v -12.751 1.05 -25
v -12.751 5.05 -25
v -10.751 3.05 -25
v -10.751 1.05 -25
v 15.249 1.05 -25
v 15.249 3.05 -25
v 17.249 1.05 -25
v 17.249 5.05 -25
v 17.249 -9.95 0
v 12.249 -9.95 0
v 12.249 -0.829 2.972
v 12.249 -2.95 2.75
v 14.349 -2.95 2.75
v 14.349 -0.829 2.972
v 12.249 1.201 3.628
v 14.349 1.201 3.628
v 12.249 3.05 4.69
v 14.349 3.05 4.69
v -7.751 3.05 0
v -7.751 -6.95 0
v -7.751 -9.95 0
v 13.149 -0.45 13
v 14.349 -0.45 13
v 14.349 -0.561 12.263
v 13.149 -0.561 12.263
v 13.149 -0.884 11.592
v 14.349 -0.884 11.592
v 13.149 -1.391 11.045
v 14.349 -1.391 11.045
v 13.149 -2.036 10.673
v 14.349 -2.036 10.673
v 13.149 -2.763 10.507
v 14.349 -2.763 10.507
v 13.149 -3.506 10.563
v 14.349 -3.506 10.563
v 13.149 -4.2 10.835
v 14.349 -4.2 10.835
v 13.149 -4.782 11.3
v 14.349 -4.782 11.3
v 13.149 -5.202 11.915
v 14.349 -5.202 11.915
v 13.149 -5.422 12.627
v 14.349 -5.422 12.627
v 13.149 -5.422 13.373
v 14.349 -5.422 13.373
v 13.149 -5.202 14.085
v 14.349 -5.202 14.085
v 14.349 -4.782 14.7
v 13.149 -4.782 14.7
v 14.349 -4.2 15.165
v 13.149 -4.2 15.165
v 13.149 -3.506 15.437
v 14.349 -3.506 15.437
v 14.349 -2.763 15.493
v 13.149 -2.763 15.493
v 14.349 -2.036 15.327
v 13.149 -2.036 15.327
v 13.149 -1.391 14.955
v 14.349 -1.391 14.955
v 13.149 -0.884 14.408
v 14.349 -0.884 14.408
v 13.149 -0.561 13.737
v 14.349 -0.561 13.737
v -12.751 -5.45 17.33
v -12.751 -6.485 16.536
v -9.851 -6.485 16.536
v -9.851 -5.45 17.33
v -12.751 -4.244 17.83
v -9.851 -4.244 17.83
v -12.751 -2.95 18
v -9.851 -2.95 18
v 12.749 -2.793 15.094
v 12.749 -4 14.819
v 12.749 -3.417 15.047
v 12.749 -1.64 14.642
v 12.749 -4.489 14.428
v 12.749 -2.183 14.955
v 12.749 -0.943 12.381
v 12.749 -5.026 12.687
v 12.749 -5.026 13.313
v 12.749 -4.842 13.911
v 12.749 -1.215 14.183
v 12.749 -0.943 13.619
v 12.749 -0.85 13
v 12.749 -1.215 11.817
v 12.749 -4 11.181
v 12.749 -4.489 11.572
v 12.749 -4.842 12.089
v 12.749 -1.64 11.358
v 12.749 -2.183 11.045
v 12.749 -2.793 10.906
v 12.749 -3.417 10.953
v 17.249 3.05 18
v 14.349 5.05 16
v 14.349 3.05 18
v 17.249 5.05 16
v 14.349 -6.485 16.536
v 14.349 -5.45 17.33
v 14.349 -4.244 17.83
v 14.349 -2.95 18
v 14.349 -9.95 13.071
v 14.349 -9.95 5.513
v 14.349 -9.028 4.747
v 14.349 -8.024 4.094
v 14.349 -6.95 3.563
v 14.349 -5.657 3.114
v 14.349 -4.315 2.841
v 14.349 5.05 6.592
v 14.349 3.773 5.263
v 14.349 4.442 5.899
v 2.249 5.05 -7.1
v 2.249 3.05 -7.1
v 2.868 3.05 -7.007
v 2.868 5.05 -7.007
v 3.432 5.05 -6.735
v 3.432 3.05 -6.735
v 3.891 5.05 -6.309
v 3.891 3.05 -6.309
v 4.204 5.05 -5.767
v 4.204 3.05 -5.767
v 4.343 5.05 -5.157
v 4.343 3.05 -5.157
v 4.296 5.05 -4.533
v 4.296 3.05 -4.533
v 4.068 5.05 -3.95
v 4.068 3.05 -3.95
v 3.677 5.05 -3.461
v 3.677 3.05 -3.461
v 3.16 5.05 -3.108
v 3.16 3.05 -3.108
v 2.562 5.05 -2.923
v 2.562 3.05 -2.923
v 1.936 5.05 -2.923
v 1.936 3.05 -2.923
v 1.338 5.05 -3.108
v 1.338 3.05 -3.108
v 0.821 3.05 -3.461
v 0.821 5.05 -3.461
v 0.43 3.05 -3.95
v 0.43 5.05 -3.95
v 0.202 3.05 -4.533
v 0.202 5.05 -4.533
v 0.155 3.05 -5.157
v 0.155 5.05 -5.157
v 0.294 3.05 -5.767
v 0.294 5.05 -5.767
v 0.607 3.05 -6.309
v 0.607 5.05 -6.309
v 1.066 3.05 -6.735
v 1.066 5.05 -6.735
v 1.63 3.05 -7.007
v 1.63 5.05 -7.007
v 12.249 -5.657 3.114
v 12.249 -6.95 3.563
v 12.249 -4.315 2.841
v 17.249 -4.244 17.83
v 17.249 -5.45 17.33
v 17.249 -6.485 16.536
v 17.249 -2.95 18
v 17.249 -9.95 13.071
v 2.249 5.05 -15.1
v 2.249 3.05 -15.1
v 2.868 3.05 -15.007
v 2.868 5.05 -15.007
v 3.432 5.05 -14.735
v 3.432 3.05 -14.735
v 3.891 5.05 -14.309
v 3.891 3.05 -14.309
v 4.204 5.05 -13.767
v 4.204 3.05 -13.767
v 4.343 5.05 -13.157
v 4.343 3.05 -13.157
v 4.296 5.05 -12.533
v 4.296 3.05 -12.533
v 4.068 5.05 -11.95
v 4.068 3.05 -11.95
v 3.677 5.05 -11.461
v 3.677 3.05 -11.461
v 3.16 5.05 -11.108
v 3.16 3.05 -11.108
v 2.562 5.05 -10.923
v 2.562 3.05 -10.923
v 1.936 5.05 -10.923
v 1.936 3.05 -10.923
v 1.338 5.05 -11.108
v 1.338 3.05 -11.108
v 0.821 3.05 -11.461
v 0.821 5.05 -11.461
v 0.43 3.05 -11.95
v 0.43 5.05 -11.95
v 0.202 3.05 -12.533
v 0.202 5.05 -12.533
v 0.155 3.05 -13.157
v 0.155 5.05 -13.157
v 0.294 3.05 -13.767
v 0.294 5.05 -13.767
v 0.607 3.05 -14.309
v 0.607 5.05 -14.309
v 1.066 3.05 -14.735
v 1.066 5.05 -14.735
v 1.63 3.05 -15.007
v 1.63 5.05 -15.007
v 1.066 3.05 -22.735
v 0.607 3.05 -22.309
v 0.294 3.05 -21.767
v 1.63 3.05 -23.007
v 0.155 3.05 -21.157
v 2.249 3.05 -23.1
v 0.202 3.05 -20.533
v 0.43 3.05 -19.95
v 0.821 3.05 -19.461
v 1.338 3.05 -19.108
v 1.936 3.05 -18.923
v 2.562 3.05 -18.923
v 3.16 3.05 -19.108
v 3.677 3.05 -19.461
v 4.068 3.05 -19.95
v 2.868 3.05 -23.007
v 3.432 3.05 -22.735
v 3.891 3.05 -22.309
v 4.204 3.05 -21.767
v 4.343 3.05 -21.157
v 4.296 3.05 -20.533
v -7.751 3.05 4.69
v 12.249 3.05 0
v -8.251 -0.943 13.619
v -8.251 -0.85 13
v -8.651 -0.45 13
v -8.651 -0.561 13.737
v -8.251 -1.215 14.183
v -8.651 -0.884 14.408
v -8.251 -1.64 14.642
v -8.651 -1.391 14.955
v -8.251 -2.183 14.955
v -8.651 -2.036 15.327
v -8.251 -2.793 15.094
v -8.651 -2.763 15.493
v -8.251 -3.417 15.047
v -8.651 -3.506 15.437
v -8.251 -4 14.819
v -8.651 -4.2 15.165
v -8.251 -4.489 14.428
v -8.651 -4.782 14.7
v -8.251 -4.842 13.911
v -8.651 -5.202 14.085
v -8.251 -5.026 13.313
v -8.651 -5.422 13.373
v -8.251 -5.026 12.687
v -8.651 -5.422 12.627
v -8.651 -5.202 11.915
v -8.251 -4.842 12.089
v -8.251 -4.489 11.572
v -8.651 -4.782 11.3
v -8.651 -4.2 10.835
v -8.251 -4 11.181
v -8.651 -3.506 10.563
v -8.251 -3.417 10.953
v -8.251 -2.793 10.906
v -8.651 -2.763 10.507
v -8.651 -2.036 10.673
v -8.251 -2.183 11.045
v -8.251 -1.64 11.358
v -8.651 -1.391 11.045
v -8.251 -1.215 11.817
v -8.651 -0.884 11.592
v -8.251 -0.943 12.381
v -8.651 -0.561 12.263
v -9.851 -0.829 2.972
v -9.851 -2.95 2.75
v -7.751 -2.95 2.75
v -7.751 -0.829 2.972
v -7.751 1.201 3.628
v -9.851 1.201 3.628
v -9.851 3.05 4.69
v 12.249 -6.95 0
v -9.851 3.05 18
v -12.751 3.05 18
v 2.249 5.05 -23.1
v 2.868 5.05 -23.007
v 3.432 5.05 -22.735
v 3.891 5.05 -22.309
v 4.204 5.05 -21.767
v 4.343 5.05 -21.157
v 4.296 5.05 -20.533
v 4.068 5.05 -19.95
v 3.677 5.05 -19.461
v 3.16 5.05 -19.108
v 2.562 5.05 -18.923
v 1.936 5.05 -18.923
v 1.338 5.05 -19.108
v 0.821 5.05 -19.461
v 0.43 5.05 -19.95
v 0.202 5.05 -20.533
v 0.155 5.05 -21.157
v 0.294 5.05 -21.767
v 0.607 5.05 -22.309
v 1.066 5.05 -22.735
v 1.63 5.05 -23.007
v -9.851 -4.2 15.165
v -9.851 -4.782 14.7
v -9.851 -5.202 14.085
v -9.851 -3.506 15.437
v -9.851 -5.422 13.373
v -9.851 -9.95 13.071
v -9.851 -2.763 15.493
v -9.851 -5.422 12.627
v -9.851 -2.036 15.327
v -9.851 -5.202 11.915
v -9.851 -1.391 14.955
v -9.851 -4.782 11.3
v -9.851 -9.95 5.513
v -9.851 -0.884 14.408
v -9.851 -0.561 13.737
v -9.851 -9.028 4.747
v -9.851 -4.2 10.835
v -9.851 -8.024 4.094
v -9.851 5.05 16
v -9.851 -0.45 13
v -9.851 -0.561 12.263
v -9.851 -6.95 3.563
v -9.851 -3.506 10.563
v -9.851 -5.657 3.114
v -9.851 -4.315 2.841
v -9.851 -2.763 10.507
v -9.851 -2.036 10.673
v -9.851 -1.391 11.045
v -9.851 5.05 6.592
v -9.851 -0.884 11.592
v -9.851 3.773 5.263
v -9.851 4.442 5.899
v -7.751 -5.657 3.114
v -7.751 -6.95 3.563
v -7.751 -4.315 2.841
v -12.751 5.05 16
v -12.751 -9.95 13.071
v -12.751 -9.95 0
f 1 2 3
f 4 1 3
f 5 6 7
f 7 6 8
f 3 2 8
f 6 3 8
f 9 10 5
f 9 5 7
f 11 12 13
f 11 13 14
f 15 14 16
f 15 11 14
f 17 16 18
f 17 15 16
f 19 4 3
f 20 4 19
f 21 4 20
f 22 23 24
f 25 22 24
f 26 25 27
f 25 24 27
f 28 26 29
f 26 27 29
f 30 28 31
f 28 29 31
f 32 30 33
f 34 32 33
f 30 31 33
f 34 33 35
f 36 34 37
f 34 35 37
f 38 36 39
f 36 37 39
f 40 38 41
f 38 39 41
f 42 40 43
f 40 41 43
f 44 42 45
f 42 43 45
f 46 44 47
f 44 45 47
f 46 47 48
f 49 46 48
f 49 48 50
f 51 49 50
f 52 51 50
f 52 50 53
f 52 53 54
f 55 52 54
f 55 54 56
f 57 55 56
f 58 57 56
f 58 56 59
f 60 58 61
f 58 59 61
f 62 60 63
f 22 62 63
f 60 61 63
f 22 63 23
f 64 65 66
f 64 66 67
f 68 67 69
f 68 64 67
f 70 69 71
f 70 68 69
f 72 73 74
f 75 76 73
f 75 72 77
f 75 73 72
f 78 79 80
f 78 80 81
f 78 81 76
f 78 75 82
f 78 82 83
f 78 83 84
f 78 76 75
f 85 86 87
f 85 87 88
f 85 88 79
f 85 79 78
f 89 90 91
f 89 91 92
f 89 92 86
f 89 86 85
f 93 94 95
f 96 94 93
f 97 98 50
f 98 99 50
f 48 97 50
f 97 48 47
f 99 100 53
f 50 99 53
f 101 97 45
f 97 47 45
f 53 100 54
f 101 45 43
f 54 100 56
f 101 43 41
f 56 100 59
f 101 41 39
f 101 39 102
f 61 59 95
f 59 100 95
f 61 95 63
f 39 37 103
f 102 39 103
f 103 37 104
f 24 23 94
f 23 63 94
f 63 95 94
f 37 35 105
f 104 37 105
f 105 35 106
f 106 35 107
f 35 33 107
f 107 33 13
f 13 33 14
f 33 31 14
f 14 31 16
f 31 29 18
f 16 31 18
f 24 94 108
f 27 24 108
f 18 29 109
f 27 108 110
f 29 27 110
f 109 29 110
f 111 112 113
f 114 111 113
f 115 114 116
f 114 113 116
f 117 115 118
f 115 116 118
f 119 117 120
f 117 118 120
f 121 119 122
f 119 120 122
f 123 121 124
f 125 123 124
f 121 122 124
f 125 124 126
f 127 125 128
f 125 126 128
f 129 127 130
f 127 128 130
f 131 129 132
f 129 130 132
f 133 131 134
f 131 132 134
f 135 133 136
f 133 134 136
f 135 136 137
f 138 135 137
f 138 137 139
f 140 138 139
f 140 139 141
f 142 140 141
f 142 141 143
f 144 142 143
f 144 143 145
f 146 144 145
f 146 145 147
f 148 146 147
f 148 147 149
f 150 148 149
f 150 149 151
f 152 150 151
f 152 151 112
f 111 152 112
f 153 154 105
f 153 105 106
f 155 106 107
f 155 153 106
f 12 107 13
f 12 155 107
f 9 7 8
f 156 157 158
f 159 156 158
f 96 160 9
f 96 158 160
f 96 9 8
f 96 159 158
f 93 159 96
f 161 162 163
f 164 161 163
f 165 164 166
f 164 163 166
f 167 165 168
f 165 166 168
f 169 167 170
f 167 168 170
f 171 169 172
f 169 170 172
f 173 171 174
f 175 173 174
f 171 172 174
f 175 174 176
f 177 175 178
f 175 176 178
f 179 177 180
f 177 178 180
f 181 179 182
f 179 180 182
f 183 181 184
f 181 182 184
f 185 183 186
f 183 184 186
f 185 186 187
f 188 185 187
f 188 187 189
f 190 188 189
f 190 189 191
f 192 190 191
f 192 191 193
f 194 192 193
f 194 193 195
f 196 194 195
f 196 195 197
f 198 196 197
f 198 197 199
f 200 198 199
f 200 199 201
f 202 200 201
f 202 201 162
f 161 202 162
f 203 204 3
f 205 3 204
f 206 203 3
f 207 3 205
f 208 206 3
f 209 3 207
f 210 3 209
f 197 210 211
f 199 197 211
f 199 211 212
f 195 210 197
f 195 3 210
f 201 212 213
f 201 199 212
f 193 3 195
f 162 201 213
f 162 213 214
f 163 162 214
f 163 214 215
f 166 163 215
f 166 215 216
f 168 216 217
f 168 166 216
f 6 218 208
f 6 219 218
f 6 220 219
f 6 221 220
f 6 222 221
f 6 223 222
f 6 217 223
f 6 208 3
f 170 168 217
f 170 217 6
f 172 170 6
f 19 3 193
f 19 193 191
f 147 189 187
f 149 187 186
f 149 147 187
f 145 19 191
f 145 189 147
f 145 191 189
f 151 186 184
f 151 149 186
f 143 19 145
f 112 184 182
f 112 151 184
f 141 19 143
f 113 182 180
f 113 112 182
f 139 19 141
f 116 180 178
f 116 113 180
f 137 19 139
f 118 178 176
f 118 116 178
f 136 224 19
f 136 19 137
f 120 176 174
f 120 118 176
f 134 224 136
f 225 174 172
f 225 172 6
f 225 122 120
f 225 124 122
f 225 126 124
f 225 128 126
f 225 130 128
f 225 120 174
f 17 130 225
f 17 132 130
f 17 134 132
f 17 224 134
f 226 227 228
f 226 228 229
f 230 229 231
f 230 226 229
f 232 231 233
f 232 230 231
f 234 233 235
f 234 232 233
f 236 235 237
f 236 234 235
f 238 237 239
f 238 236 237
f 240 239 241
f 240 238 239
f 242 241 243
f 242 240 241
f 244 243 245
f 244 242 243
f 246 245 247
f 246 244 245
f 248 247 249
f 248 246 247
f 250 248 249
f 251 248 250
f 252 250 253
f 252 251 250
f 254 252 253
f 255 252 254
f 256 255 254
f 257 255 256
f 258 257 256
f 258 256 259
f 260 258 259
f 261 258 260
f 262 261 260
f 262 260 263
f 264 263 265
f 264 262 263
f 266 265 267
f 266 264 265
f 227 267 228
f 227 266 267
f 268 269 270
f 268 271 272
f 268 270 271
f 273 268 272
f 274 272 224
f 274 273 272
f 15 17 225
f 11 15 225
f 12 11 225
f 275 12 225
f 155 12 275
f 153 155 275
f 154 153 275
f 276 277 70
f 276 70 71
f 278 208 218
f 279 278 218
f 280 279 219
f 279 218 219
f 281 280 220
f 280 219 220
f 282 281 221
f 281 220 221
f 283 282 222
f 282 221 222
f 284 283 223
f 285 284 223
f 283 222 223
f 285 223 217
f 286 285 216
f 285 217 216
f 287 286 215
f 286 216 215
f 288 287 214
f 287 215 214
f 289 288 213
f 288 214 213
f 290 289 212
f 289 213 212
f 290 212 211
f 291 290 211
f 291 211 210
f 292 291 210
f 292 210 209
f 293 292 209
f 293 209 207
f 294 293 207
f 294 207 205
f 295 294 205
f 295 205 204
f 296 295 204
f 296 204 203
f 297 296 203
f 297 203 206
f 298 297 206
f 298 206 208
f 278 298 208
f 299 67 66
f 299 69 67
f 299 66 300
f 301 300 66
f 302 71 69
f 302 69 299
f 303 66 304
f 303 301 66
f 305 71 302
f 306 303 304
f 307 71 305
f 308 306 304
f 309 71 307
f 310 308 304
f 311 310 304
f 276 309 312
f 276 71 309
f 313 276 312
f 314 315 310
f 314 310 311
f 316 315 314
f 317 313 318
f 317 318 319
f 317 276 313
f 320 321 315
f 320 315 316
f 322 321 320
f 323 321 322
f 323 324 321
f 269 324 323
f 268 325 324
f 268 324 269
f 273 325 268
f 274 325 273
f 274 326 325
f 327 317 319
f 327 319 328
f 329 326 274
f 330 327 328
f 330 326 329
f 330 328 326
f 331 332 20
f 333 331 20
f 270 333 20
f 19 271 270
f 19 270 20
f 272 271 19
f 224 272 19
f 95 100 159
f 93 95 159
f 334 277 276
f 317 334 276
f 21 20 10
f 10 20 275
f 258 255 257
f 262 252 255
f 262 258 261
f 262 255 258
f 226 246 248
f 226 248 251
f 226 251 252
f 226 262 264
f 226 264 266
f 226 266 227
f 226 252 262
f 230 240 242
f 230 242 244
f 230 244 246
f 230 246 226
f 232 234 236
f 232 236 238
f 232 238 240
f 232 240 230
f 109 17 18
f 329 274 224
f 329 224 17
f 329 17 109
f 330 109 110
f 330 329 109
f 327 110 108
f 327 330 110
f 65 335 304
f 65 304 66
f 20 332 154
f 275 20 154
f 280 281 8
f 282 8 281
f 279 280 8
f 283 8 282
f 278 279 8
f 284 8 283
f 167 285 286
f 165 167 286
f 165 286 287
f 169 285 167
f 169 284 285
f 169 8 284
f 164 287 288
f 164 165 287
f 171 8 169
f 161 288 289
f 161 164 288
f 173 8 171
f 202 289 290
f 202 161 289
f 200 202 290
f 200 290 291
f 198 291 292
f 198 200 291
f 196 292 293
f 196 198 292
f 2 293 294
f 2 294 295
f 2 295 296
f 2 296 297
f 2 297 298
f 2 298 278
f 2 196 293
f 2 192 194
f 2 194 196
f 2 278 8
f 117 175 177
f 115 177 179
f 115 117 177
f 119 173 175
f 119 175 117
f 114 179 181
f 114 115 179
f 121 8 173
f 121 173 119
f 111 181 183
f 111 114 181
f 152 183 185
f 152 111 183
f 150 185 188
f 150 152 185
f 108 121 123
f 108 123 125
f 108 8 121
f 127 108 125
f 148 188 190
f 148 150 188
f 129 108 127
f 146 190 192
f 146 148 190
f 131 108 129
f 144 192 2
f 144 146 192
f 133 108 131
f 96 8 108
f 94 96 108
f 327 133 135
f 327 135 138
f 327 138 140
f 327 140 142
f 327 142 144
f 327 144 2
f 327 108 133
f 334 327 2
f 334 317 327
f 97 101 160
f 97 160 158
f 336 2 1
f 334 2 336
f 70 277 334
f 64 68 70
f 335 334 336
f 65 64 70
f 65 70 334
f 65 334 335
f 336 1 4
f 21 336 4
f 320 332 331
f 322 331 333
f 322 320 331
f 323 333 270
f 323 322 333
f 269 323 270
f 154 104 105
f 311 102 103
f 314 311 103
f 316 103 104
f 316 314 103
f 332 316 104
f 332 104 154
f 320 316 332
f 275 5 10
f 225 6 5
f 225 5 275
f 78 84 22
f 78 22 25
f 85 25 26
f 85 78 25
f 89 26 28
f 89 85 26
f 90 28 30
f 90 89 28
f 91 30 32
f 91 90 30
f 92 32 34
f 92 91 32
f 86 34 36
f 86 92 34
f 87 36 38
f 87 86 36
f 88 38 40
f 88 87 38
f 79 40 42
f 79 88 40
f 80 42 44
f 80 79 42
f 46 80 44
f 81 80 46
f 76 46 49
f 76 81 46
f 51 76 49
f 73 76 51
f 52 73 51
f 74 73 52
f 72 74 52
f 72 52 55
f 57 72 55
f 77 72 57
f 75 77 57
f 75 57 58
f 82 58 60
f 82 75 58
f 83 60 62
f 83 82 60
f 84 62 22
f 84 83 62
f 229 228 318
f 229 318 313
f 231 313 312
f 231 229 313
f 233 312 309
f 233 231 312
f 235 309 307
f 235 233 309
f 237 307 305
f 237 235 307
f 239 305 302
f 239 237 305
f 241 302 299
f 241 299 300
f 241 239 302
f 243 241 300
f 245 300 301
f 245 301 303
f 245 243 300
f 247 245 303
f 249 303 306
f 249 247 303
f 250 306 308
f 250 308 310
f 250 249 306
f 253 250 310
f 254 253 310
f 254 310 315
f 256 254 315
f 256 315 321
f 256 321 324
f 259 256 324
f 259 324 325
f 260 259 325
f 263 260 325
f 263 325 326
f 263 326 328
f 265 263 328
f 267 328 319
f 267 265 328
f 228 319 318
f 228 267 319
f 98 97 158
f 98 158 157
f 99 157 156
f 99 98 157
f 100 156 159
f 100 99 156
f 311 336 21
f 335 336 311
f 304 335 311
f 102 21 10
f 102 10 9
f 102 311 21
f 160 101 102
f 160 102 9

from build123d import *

# Parameters (mm, degrees)
SKETCH_1_W               = 30
SKETCH_1_H               = 15
EXTRUDE_1_DEPTH          = 18
CUT_EXTRUDE_1_REACH      = 28.843
SKETCH_2_W               = 20
SKETCH_2_H               = 10
CUT_EXTRUDE_2_REACH      = 29.668
SKETCH_3_W               = 20
SKETCH_3_H               = 12
CUT_EXTRUDE_5_DEPTH      = 22.1
CUT_EXTRUDE_5_DEPTH_BACK = 2.1
SKETCH_4_W               = 5
SKETCH_4_H               = 6
SKETCH_5_R               = 2.5
EXTRUDE_2_DEPTH          = 1.6
EXTRUDE_START            = 1.6
SKETCH_6_R               = 2.5
EXTRUDE_3_DEPTH          = 1.6
CHAMFER_1_SIZE           = 0.4
CUT_EXTRUDE_6_DEPTH      = 35.020684023
CUT_EXTRUDE_6_DEPTH_BACK = 35.020684023
CUT_EXTRUDE_7_DEPTH      = 35.020684023
CUT_EXTRUDE_7_DEPTH_BACK = 35.020684023
CHAMFER_2_SIZE           = 2
EXTRUDE_4_DEPTH          = 25
CHAMFER_3_SIZE           = 25
CHAMFER_3_SIZE2          = 11
SKETCH_10_R              = 2.1
CUT_EXTRUDE_8_DEPTH      = 15
CHAMFER_4_SIZE           = 3
CHAMFER_4_SIZE_2         = 25


with BuildPart() as part:
    # 草圖1 → 填料-伸長1 (new body)
    with BuildSketch(Plane.XY):
        with Locations((2.249045701, -2.44972067)):
            Rectangle(SKETCH_1_W, SKETCH_1_H)
    extrude(amount=EXTRUDE_1_DEPTH)

    # 草圖2 → 除料-伸長1 (cut, up to next)
    with BuildSketch(Plane.XY.offset(18), mode=Mode.PRIVATE) as cut_extrude_1_sk1:
        with Locations((2.249045701, -1.94972067)):
            Rectangle(SKETCH_2_W, SKETCH_2_H)
    cut_extrude_1_tool1 = extrude(cut_extrude_1_sk1.sketch, amount=-CUT_EXTRUDE_1_REACH, mode=Mode.PRIVATE) & part.part
    add(cut_extrude_1_tool1.solids().sort_by_distance((2.249046, -1.949721, 18))[0], mode=Mode.SUBTRACT)

    # 草圖3 → 除料-伸長2 (cut, up to next)
    with BuildSketch(Plane(origin=(0, -6.94972067, 0), x_dir=(1, 0, 0), z_dir=(0, 1, 0)), mode=Mode.PRIVATE) as cut_extrude_2_sk1:
        with Locations((2.249045701, -12)):
            Rectangle(SKETCH_3_W, SKETCH_3_H)
    cut_extrude_2_tool1 = extrude(cut_extrude_2_sk1.sketch, amount=-CUT_EXTRUDE_2_REACH, mode=Mode.PRIVATE) & part.part
    add(cut_extrude_2_tool1.solids().sort_by_distance((2.249046, -6.949721, 12))[0], mode=Mode.SUBTRACT)

    # 草圖4 → 除料-伸長5 (cut, two sides: drawn at the far end of the back side and taken through both)
    with BuildSketch(Plane(origin=(-7.750954299, 0, 0), x_dir=(0, 0, -1), z_dir=(1, 0, 0)).offset(-CUT_EXTRUDE_5_DEPTH_BACK)):
        with Locations((-15.5, 0.05027933)):
            Rectangle(SKETCH_4_W, SKETCH_4_H)
        with BuildLine():
            Line((-13, 3.05027933), (-13, -2.94972067))
            Line((-13, -2.94972067), (-18, -2.94972067))
            Line((-18, -2.94972067), (-18, -9.94972067))
            Line((-18, -9.94972067), (-6, -9.94972067))
            Line((-6, -9.94972067), (-6, -6.94972067))
            Line((-6, -6.94972067), (-3.562706956, -6.94972067))
            ThreePointArc((-3.562706956, -6.94972067), (-2.955231369, -4.990584005), (-2.75, -2.94972067))
            ThreePointArc((-2.75, -2.94972067), (-3.246950555, 0.203139384), (-4.689614931, 3.05027933))
            Line((-4.689614931, 3.05027933), (-13, 3.05027933))
        make_face()
        with BuildLine():
            ThreePointArc((-18, 5.998044414), (-15.583399687, 6.969379392), (-13, 7.30027933))
            Line((-13, 7.30027933), (-13, 7.89449882))
            Line((-13, 7.89449882), (-18, 7.89449882))
            Line((-18, 7.89449882), (-18, 5.998044414))
        make_face()
        with BuildLine():
            Line((-13, 7.30027933), (-13, 3.05027933))
            Line((-13, 3.05027933), (-4.689614931, 3.05027933))
            ThreePointArc((-4.689614931, 3.05027933), (-8.332961324, 6.176135454), (-13, 7.30027933))
        make_face()
        with BuildLine():
            Line((-18, 3.05027933), (-13, 3.05027933))
            Line((-13, 3.05027933), (-13, 7.30027933))
            ThreePointArc((-13, 7.30027933), (-15.583399687, 6.969379392), (-18, 5.998044414))
            Line((-18, 5.998044414), (-18, 3.05027933))
        make_face()
        with BuildLine():
            Line((-18, -9.94972067), (-18, -2.94972067))
            Line((-18, -2.94972067), (-18, 3.05027933))
            Line((-18, 3.05027933), (-18, 5.998044414))
            ThreePointArc((-18, 5.998044414), (-19.843504041, -10.580510436), (-3.562706956, -6.94972067))
            Line((-3.562706956, -6.94972067), (-6, -6.94972067))
            Line((-6, -6.94972067), (-6, -9.94972067))
            Line((-6, -9.94972067), (-18, -9.94972067))
        make_face()
    extrude(amount=CUT_EXTRUDE_5_DEPTH + CUT_EXTRUDE_5_DEPTH_BACK, mode=Mode.SUBTRACT)

    # 草圖5 → 填料-伸長2 (add)
    with BuildSketch(Plane.ZY.offset(-14.349045701)):
        with Locations(Location((13, -2.94972067, 0), (0, 0, 90))):
            Circle(SKETCH_5_R)
    extrude(amount=EXTRUDE_2_DEPTH)

    # 草圖6 → 填料-伸長3 (add)
    with BuildSketch(Plane(origin=(-9.850954299, 0, 0), x_dir=(0, 0, -1), z_dir=(1, 0, 0)).offset(EXTRUDE_START)):
        with Locations(Location((-13, -2.94972067, 0), (0, 0, 90))):
            Circle(SKETCH_6_R)
    extrude(amount=-EXTRUDE_3_DEPTH)

    # 導角1
    chamfer_1_edges = [part.edges().sort_by_distance(p)[0] for p in [
        (12.749045701, -5.44972067, 13),
        (-8.250954299, -5.44972067, 13),
    ]]
    chamfer(chamfer_1_edges, length=CHAMFER_1_SIZE)

    # 草圖7 → 除料-伸長6 (cut, two sides: drawn at the far end of the back side and taken through both)
    with BuildSketch(Plane(origin=(-9.850954299, 0, 0), x_dir=(0, 0, -1), z_dir=(1, 0, 0)).offset(-CUT_EXTRUDE_6_DEPTH_BACK)):
        Polygon((-18, -9.94972067), (-13.071067812, -9.94972067), (-18, -5.020788482), align=None)
    extrude(amount=CUT_EXTRUDE_6_DEPTH + CUT_EXTRUDE_6_DEPTH_BACK, mode=Mode.SUBTRACT)

    # 草圖8 → 除料-伸長7 (cut, two sides: drawn at the far end of the back side and taken through both)
    with BuildSketch(Plane(origin=(-9.850954299, 0, 0), x_dir=(0, 0, -1), z_dir=(1, 0, 0)).offset(-CUT_EXTRUDE_7_DEPTH_BACK)):
        with BuildLine():
            Line((-18, -2.94972067), (-18, -5.020788482))
            Line((-18, -5.020788482), (-16.535533871, -6.485254612))
            ThreePointArc((-16.535533871, -6.485254612), (-17.619397653, -4.863137855), (-18, -2.94972067))
        make_face()
    extrude(amount=CUT_EXTRUDE_7_DEPTH + CUT_EXTRUDE_7_DEPTH_BACK, mode=Mode.SUBTRACT)

    # 導角2
    chamfer_2_edges = [part.edges().sort_by_distance(p)[0] for p in [
        (15.799045701, 5.05027933, 18),
        (-11.300954299, 5.05027933, 18),
    ]]
    chamfer(chamfer_2_edges, length=CHAMFER_2_SIZE)

    # 草圖9 → 填料-伸長4 (add)
    with BuildSketch(Plane(origin=(0, 0, 0), x_dir=(-1, 0, 0), z_dir=(0, 0, -1))):
        Polygon((-12.249045701, 3.05027933), (-12.249045701, -9.94972067), (-17.249045701, -9.94972067), (-17.249045701, 5.05027933), (12.750954299, 5.05027933), (12.750954299, -9.94972067), (7.750954299, -9.94972067), (7.750954299, 3.05027933), align=None)
    extrude(amount=EXTRUDE_4_DEPTH)

    # 導角3
    chamfer_3_edges = [part.edges().sort_by_distance(p)[0] for p in [
        (-10.250954299, -9.94972067, -25),
        (14.749045701, -9.94972067, -25),
    ]]
    chamfer_3_side = [part.faces().sort_by_distance(p)[0] for p in [
        (2.249045701, -9.94972067, 0.484706737),
    ]]
    chamfer(chamfer_3_edges, length=CHAMFER_3_SIZE, length2=CHAMFER_3_SIZE2, reference=chamfer_3_side[0])

    # 草圖10 → 除料-伸長8 (cut)
    with BuildSketch(Plane.XZ.offset(-3.05027933)):
        with Locations(Location((2.249045701, -21, 0), (0, 0, 270))):
            Circle(SKETCH_10_R)
        with Locations(Location((2.249045701, -13, 0), (0, 0, 270))):
            Circle(SKETCH_10_R)
        with Locations(Location((2.249045701, -5, 0), (0, 0, 270))):
            Circle(SKETCH_10_R)
    extrude(amount=-CUT_EXTRUDE_8_DEPTH, mode=Mode.SUBTRACT)

    # 導角4
    # the kernel refuses this chamfer: 25, 3 mm, written as the material it takes off along each edge
    with BuildSketch(Plane(origin=(-7.750954299, -63.93259543, -25), x_dir=(-0.952888564534268, 0, -0.3033205953769419), z_dir=(0, 1, 0)), Plane(origin=(12.249045701, 3.05027933, -25), x_dir=(0.952888564534268, 0, -0.3033205953769419), z_dir=(0, -1, 0))) as chamfer_4_piece_1:
        Polygon((CHAMFER_4_SIZE * 0.952888564534, CHAMFER_4_SIZE * 0.303320595377), (-CHAMFER_4_SIZE_2 * 0.303320595377, CHAMFER_4_SIZE_2 * 0.952888564534), (0, 0), align=None)
    extrude(amount=66.98287476, mode=Mode.SUBTRACT)


solid = part.part
